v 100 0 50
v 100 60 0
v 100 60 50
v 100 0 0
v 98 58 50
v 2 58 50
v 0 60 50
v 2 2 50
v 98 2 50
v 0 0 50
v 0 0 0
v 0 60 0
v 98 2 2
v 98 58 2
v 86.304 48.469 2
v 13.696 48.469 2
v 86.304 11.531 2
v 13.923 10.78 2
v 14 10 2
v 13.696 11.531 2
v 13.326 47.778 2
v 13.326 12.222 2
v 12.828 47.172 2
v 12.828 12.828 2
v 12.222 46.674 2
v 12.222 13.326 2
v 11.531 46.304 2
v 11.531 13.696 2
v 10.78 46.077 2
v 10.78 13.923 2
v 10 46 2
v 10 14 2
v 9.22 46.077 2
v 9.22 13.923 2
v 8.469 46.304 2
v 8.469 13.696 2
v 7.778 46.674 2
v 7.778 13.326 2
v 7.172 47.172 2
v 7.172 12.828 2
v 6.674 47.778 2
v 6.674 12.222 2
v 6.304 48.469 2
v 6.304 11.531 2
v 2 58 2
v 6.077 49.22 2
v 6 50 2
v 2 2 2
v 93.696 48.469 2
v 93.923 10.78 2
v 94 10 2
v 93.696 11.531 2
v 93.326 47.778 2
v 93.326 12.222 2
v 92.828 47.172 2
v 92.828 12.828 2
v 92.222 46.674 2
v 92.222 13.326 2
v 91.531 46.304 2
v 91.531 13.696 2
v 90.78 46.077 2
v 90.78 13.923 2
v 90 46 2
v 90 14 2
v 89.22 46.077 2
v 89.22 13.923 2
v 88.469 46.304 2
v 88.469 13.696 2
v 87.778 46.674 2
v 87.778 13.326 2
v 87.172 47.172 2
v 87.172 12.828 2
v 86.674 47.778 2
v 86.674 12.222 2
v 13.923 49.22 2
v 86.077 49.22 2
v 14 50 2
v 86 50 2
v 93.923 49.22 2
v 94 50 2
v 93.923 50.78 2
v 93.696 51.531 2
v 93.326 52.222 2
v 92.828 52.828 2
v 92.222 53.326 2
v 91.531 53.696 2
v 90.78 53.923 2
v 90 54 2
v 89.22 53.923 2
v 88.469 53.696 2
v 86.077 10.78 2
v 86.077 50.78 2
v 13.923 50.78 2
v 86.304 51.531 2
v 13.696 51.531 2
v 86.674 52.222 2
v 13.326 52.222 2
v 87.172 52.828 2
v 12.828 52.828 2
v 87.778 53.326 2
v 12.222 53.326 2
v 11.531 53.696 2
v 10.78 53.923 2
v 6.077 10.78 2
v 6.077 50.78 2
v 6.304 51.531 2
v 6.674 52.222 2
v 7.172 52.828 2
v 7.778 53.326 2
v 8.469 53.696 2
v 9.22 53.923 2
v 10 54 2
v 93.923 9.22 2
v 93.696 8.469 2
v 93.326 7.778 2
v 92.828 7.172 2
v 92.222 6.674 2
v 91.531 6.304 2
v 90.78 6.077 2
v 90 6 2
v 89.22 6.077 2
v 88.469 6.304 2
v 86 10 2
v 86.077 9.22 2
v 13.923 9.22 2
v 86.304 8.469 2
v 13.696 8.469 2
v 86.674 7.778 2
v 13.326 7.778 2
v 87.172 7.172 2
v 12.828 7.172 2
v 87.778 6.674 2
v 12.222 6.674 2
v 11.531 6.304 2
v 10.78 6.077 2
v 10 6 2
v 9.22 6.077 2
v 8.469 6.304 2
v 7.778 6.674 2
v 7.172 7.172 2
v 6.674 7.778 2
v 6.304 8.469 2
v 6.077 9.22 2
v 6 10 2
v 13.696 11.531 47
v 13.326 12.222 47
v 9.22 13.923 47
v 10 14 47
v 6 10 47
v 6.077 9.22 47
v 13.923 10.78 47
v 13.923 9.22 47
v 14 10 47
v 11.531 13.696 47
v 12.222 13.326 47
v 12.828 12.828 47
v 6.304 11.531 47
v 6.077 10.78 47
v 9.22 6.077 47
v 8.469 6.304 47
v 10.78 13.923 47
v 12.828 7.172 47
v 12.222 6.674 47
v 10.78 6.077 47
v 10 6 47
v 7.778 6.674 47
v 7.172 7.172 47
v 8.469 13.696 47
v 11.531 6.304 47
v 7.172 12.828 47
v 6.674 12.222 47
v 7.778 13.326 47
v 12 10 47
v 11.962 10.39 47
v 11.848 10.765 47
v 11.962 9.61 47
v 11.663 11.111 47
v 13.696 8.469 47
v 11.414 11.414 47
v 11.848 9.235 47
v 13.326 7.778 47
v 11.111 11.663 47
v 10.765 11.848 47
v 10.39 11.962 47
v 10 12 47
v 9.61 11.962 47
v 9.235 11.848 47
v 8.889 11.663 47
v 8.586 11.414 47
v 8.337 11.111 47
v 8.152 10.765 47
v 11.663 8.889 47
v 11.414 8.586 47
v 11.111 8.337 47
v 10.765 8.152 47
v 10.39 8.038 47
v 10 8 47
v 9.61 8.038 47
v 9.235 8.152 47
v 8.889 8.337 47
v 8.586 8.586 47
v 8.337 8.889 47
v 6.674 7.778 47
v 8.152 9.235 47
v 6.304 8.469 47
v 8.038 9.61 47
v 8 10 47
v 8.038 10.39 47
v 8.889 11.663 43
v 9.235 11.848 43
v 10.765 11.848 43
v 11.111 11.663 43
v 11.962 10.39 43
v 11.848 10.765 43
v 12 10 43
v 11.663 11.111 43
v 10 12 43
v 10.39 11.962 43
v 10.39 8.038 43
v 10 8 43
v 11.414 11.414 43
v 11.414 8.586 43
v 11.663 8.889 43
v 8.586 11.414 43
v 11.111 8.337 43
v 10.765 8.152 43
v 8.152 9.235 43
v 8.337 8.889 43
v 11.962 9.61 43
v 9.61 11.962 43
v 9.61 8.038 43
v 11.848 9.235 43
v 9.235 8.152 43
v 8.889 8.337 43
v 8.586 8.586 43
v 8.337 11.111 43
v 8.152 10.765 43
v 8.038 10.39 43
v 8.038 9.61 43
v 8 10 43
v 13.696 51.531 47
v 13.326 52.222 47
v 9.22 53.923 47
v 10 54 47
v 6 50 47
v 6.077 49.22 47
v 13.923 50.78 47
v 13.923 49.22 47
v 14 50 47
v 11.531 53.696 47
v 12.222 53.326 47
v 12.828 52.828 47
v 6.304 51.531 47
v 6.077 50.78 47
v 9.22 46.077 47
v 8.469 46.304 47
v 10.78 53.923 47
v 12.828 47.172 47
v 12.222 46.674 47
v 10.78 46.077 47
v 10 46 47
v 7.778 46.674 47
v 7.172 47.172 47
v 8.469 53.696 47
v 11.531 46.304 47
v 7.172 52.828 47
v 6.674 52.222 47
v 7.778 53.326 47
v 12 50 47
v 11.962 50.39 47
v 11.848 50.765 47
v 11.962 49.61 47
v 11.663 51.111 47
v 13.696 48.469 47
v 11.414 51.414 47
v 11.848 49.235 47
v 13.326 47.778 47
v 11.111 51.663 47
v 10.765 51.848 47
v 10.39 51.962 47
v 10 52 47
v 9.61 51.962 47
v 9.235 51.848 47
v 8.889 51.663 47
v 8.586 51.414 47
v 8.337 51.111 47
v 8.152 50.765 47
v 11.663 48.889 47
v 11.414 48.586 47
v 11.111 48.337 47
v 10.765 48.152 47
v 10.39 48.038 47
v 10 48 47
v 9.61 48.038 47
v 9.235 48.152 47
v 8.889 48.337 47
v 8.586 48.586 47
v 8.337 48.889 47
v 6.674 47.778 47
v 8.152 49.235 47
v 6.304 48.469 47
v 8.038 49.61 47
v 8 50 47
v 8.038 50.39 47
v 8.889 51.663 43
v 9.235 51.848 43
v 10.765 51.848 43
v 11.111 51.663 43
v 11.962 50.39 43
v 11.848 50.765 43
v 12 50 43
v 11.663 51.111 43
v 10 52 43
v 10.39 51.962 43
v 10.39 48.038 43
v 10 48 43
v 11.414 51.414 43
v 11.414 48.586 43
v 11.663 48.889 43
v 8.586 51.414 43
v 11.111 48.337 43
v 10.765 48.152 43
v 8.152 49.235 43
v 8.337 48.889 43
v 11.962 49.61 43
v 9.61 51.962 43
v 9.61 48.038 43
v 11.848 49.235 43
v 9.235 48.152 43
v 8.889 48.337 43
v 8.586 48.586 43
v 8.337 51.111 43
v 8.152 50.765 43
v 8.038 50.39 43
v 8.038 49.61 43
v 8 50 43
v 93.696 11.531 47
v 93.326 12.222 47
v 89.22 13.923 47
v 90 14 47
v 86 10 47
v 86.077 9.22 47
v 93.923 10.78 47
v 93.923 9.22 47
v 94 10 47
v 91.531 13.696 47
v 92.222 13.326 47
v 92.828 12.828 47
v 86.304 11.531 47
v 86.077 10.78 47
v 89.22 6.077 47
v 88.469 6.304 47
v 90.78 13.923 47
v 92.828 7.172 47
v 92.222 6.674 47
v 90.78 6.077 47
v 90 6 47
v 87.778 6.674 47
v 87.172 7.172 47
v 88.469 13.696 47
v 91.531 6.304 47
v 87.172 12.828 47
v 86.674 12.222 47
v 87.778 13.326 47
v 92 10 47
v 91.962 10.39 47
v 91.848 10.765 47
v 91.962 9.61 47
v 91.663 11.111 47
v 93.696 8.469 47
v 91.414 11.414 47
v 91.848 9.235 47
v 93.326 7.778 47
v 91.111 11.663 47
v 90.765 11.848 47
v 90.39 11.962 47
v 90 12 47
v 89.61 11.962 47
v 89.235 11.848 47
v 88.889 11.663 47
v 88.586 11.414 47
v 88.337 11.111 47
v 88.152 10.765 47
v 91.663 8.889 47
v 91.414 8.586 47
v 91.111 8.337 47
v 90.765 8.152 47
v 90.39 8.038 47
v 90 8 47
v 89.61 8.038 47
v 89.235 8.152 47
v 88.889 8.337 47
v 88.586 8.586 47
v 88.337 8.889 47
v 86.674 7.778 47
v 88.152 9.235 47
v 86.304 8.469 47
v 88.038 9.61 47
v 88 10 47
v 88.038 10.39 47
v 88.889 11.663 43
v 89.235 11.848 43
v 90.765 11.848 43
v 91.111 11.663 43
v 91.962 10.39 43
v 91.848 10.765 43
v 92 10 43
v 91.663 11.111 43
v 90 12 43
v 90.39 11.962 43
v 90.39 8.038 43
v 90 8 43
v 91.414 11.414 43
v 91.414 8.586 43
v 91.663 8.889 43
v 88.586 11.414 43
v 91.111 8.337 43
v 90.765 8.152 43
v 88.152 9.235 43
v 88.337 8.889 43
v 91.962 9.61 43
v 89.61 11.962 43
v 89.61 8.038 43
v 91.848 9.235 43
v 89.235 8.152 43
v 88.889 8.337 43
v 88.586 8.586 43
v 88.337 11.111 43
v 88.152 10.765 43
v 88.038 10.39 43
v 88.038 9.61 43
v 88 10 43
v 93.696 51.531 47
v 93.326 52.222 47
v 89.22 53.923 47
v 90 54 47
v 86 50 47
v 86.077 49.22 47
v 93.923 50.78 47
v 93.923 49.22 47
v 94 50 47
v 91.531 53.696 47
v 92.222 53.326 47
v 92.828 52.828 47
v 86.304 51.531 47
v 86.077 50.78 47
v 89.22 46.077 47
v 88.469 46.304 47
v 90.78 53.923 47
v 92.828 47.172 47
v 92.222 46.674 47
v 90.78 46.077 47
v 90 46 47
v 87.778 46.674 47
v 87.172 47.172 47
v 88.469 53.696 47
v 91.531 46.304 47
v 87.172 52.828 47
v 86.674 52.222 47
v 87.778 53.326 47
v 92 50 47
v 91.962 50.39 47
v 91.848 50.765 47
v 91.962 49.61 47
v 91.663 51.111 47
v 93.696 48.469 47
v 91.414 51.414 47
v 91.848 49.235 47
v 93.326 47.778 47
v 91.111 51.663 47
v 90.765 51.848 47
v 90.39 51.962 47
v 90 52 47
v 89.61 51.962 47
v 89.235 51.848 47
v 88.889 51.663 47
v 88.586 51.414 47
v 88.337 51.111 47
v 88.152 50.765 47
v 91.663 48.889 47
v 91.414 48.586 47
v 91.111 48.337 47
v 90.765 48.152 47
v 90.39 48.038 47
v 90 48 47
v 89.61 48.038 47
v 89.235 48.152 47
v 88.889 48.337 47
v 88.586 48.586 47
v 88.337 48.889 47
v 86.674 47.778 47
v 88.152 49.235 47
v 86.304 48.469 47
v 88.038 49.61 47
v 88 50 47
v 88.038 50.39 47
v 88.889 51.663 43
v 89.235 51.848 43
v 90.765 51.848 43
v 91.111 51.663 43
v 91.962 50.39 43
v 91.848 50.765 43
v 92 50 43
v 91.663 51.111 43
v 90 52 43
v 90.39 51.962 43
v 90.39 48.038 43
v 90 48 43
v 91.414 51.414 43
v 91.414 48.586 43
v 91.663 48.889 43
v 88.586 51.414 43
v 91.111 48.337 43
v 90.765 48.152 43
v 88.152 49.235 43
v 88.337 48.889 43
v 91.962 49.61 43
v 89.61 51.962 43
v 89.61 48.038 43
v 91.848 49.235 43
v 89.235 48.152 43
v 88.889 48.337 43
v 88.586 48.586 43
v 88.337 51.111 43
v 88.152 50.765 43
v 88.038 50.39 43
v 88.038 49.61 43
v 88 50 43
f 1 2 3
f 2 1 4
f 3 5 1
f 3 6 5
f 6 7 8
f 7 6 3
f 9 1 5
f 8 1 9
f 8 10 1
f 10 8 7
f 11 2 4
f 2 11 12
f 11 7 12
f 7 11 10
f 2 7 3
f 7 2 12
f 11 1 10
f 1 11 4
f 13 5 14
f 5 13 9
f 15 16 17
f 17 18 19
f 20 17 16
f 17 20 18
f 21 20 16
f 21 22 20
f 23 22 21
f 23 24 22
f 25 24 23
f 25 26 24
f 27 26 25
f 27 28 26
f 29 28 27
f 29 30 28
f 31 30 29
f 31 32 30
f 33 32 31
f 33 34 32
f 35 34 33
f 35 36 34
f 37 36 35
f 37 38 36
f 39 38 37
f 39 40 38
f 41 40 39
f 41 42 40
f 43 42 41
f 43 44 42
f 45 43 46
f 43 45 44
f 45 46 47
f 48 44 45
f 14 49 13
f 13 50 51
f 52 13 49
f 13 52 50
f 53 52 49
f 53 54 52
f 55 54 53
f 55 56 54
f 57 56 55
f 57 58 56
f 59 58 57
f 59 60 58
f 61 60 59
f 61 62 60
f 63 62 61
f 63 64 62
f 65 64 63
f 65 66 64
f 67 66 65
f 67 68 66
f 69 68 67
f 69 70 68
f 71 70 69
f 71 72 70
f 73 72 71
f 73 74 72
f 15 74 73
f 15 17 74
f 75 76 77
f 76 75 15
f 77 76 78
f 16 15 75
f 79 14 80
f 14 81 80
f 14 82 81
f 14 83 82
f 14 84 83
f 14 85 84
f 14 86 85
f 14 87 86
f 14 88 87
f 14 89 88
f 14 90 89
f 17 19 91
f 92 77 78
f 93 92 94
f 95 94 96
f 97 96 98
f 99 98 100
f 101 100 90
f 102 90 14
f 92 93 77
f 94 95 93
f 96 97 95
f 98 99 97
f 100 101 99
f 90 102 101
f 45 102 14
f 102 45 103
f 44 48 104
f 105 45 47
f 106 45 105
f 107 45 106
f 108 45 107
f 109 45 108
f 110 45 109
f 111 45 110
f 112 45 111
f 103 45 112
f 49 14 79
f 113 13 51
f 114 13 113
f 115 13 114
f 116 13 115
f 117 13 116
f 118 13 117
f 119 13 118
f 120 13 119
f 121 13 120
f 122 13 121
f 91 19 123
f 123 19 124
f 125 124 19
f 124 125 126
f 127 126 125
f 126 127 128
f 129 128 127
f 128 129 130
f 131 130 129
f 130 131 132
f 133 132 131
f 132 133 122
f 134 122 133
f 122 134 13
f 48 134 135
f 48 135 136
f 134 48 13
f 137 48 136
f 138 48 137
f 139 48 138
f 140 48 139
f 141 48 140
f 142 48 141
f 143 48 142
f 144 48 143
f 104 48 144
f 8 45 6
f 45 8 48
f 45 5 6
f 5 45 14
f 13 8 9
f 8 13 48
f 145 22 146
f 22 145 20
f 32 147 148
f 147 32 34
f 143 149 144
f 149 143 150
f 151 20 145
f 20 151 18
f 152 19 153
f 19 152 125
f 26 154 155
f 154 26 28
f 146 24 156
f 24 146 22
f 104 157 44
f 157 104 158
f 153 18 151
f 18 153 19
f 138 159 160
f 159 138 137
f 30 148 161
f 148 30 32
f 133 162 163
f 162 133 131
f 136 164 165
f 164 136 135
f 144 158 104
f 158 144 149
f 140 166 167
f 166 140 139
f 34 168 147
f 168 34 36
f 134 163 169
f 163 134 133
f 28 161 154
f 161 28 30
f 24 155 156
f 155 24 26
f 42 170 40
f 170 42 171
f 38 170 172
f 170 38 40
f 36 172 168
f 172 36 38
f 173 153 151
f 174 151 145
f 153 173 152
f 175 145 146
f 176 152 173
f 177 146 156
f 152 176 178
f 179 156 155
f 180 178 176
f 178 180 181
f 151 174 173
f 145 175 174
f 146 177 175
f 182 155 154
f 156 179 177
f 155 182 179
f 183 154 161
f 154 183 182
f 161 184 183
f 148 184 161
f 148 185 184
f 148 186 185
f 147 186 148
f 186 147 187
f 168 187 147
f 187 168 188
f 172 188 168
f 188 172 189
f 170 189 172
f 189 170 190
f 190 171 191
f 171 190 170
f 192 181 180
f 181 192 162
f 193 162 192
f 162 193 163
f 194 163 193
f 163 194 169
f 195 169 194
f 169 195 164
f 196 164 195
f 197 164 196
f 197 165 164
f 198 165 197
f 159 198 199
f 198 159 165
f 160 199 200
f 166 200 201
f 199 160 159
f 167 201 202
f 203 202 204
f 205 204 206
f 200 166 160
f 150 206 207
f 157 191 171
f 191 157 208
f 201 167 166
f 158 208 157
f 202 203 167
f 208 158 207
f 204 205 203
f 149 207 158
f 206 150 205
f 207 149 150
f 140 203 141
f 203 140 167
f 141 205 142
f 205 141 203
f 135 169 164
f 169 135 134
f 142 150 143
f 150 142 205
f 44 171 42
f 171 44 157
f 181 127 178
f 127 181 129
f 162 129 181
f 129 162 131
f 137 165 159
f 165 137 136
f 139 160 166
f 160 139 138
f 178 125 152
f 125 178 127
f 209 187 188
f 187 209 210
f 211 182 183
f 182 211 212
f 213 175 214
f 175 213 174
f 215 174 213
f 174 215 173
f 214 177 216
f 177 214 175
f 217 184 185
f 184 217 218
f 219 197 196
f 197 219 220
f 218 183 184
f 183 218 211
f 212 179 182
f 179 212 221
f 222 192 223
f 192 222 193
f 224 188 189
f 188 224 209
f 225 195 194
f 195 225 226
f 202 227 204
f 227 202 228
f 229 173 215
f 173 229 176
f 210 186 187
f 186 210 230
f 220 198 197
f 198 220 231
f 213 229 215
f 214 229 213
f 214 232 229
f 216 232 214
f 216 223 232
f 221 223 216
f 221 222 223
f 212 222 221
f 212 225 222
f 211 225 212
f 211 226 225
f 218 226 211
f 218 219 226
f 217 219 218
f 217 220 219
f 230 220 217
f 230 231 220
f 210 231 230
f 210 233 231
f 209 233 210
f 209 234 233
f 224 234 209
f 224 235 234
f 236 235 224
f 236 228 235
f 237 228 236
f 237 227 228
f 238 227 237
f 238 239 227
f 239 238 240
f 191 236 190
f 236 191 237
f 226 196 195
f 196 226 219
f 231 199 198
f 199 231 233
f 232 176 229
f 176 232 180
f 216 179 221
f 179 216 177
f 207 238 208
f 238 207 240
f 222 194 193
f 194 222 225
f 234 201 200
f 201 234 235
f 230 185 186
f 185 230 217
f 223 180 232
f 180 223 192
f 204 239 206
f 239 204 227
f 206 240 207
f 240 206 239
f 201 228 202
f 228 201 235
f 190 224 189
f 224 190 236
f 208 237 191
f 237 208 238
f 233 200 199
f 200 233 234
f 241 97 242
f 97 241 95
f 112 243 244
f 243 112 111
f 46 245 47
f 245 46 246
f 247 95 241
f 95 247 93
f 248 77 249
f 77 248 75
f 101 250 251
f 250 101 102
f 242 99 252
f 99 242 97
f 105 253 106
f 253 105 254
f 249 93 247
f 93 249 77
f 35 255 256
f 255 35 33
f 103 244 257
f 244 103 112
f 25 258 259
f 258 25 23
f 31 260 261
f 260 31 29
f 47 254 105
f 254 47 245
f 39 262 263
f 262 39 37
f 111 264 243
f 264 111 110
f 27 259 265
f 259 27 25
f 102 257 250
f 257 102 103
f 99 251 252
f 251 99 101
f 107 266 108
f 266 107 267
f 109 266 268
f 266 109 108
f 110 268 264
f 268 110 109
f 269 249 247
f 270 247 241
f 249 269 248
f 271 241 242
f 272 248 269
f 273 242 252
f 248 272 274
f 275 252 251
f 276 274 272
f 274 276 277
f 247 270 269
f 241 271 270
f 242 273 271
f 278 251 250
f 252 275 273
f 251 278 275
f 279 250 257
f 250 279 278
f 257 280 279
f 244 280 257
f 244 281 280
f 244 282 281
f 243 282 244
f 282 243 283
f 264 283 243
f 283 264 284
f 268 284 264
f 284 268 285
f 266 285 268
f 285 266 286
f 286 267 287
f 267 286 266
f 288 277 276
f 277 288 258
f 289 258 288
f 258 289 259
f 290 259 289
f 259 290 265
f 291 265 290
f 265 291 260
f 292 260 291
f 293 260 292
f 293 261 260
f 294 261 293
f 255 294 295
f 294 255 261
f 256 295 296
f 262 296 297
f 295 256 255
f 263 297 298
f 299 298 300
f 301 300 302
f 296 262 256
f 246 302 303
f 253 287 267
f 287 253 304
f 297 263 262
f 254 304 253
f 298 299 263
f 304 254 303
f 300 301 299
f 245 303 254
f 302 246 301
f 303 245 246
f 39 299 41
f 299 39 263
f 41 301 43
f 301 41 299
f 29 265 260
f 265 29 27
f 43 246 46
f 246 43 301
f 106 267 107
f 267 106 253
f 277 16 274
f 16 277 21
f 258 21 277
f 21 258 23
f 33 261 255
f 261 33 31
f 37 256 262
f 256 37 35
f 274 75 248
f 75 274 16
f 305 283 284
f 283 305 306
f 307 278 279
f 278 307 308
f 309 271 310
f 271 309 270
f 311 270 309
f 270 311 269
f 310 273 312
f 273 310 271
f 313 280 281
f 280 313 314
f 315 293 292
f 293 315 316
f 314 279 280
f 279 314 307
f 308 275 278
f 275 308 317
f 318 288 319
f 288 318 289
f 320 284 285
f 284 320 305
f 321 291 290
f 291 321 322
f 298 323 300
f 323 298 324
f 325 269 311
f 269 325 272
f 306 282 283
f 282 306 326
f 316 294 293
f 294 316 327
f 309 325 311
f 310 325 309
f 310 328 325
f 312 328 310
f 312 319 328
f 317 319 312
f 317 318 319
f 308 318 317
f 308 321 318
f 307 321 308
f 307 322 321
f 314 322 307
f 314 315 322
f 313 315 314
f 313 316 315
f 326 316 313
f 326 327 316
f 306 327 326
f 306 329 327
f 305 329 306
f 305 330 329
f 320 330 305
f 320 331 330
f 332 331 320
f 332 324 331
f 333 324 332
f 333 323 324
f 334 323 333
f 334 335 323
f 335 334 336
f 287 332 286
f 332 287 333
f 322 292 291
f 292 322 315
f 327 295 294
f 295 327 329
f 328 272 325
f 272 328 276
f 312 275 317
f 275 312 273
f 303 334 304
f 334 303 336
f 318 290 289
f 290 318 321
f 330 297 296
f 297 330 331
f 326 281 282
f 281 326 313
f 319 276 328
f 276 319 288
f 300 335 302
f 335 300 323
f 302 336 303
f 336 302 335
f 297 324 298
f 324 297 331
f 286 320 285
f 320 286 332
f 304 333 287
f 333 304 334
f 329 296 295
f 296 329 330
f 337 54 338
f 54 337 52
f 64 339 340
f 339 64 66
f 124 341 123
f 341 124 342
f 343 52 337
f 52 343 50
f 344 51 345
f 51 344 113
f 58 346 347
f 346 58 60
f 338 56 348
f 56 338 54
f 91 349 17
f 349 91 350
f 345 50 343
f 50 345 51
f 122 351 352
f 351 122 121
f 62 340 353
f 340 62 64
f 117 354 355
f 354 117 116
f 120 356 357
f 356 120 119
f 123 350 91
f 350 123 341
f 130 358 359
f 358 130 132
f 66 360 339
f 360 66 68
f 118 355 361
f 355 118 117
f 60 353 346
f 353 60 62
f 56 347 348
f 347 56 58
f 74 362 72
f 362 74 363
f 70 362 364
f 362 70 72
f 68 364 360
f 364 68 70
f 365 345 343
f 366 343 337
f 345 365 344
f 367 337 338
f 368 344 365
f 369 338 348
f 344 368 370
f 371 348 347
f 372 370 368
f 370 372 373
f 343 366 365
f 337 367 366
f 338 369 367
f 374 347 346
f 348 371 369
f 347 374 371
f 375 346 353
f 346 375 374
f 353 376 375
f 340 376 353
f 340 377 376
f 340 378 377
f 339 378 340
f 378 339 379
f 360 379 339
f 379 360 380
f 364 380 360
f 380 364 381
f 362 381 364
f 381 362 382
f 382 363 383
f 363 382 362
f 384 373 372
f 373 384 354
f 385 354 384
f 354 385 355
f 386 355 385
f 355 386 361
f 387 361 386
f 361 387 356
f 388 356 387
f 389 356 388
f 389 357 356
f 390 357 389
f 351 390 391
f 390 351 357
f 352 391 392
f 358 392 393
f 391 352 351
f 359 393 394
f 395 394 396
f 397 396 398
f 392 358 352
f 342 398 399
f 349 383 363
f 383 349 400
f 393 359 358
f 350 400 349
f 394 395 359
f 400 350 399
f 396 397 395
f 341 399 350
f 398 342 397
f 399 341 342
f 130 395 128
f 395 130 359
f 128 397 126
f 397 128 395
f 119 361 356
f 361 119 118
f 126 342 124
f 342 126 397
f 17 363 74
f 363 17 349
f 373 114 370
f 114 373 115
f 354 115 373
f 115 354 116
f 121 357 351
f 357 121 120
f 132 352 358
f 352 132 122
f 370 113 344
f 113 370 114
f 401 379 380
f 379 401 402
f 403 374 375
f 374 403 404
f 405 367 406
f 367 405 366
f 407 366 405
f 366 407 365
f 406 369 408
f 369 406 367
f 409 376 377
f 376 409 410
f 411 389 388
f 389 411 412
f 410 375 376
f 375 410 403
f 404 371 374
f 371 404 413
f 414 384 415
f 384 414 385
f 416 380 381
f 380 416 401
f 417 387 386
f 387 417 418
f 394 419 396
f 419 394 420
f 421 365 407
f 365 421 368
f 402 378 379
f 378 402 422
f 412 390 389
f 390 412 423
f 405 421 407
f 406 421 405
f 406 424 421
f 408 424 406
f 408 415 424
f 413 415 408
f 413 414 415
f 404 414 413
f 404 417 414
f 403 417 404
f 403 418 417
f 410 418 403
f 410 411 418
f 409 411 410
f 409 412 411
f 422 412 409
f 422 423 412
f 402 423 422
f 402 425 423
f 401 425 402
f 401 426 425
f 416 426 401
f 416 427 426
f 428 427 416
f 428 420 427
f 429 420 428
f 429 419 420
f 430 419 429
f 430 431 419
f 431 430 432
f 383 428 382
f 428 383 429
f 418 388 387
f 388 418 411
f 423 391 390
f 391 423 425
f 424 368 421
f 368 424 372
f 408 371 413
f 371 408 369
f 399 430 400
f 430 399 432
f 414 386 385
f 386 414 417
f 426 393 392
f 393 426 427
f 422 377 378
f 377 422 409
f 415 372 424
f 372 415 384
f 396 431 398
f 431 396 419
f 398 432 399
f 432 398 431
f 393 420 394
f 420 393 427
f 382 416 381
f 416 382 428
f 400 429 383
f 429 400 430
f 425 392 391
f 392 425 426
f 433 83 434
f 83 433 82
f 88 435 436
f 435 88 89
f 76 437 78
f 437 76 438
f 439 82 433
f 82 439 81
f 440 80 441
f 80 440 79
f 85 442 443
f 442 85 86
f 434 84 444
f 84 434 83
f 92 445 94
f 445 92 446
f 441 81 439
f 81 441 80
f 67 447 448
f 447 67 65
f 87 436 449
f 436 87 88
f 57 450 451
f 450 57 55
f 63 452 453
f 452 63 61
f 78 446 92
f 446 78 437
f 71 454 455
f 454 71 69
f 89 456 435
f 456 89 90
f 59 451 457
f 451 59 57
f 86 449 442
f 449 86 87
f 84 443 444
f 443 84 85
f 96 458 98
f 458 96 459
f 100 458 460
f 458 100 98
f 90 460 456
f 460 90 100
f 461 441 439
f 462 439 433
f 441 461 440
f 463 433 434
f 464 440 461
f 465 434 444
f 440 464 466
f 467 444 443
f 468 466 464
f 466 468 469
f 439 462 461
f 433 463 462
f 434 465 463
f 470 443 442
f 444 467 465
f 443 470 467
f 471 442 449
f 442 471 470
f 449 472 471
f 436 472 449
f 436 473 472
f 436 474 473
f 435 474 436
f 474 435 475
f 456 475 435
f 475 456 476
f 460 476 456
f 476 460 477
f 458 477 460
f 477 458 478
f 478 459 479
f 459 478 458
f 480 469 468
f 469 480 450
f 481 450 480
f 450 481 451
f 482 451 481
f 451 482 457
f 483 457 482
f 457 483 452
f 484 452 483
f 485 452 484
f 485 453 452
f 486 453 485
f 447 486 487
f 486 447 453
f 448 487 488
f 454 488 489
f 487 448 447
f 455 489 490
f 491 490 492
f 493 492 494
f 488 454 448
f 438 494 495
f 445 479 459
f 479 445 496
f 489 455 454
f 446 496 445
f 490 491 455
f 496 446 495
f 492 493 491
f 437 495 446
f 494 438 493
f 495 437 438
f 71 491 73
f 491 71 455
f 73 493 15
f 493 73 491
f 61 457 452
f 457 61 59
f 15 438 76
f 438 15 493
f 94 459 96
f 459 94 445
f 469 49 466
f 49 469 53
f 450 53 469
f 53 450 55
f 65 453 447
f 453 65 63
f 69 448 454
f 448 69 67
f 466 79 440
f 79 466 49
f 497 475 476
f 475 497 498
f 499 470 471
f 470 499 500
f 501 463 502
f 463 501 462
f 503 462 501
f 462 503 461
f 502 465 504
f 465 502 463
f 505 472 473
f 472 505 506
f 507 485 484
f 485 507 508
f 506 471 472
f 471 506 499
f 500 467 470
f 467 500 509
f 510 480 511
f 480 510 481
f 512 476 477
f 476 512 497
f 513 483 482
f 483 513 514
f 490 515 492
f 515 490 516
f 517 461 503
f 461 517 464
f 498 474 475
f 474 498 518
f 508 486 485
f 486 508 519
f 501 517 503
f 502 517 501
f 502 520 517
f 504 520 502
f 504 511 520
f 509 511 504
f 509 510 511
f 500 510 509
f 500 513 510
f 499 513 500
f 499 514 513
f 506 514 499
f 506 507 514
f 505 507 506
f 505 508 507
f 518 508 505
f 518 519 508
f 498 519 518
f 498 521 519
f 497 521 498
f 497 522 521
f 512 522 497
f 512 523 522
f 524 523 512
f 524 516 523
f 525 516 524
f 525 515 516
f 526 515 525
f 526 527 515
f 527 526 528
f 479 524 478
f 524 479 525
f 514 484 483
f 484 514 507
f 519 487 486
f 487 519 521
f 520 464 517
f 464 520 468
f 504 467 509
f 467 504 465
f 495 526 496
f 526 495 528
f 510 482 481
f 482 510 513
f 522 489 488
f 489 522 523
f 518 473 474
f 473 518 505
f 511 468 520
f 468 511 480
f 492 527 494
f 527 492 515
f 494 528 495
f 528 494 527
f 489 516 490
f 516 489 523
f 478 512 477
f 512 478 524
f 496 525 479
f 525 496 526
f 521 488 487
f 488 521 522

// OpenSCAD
$fn = 32;

// ----------------------------------------------------------------------
// Enclosure box: bosses enclosure
// ----------------------------------------------------------------------

// --- parameters (mm) ---
box_l = 100;              // outer length, X
box_w = 60;               // outer width, Y
box_h = 50;               // outer height
wall_t = 2;               // wall thickness
boss_r = 4;               // corner boss radius
hole_r = 2;               // boss screw hole radius
boss_in = 10;             // boss inset from the corners

inner_h = box_h - wall_t;  // cavity depth
boss_h = inner_h - 2;  // corner boss height

difference() {
  union() {
    difference() {
      cube([box_l, box_w, box_h]);
      translate([wall_t, wall_t, wall_t])
        cube([box_l - 2 * wall_t, box_w - 2 * wall_t, box_h]);
    }
    for (sx = [0, 1], sy = [0, 1])
      translate([sx ? box_l - boss_in : boss_in,
                 sy ? box_w - boss_in : boss_in, wall_t - 1])
        difference() {
          cylinder(r = boss_r, h = boss_h);
          translate([0, 0, boss_h - 4])
            cylinder(r = hole_r, h = 5);
        }
  }
}
